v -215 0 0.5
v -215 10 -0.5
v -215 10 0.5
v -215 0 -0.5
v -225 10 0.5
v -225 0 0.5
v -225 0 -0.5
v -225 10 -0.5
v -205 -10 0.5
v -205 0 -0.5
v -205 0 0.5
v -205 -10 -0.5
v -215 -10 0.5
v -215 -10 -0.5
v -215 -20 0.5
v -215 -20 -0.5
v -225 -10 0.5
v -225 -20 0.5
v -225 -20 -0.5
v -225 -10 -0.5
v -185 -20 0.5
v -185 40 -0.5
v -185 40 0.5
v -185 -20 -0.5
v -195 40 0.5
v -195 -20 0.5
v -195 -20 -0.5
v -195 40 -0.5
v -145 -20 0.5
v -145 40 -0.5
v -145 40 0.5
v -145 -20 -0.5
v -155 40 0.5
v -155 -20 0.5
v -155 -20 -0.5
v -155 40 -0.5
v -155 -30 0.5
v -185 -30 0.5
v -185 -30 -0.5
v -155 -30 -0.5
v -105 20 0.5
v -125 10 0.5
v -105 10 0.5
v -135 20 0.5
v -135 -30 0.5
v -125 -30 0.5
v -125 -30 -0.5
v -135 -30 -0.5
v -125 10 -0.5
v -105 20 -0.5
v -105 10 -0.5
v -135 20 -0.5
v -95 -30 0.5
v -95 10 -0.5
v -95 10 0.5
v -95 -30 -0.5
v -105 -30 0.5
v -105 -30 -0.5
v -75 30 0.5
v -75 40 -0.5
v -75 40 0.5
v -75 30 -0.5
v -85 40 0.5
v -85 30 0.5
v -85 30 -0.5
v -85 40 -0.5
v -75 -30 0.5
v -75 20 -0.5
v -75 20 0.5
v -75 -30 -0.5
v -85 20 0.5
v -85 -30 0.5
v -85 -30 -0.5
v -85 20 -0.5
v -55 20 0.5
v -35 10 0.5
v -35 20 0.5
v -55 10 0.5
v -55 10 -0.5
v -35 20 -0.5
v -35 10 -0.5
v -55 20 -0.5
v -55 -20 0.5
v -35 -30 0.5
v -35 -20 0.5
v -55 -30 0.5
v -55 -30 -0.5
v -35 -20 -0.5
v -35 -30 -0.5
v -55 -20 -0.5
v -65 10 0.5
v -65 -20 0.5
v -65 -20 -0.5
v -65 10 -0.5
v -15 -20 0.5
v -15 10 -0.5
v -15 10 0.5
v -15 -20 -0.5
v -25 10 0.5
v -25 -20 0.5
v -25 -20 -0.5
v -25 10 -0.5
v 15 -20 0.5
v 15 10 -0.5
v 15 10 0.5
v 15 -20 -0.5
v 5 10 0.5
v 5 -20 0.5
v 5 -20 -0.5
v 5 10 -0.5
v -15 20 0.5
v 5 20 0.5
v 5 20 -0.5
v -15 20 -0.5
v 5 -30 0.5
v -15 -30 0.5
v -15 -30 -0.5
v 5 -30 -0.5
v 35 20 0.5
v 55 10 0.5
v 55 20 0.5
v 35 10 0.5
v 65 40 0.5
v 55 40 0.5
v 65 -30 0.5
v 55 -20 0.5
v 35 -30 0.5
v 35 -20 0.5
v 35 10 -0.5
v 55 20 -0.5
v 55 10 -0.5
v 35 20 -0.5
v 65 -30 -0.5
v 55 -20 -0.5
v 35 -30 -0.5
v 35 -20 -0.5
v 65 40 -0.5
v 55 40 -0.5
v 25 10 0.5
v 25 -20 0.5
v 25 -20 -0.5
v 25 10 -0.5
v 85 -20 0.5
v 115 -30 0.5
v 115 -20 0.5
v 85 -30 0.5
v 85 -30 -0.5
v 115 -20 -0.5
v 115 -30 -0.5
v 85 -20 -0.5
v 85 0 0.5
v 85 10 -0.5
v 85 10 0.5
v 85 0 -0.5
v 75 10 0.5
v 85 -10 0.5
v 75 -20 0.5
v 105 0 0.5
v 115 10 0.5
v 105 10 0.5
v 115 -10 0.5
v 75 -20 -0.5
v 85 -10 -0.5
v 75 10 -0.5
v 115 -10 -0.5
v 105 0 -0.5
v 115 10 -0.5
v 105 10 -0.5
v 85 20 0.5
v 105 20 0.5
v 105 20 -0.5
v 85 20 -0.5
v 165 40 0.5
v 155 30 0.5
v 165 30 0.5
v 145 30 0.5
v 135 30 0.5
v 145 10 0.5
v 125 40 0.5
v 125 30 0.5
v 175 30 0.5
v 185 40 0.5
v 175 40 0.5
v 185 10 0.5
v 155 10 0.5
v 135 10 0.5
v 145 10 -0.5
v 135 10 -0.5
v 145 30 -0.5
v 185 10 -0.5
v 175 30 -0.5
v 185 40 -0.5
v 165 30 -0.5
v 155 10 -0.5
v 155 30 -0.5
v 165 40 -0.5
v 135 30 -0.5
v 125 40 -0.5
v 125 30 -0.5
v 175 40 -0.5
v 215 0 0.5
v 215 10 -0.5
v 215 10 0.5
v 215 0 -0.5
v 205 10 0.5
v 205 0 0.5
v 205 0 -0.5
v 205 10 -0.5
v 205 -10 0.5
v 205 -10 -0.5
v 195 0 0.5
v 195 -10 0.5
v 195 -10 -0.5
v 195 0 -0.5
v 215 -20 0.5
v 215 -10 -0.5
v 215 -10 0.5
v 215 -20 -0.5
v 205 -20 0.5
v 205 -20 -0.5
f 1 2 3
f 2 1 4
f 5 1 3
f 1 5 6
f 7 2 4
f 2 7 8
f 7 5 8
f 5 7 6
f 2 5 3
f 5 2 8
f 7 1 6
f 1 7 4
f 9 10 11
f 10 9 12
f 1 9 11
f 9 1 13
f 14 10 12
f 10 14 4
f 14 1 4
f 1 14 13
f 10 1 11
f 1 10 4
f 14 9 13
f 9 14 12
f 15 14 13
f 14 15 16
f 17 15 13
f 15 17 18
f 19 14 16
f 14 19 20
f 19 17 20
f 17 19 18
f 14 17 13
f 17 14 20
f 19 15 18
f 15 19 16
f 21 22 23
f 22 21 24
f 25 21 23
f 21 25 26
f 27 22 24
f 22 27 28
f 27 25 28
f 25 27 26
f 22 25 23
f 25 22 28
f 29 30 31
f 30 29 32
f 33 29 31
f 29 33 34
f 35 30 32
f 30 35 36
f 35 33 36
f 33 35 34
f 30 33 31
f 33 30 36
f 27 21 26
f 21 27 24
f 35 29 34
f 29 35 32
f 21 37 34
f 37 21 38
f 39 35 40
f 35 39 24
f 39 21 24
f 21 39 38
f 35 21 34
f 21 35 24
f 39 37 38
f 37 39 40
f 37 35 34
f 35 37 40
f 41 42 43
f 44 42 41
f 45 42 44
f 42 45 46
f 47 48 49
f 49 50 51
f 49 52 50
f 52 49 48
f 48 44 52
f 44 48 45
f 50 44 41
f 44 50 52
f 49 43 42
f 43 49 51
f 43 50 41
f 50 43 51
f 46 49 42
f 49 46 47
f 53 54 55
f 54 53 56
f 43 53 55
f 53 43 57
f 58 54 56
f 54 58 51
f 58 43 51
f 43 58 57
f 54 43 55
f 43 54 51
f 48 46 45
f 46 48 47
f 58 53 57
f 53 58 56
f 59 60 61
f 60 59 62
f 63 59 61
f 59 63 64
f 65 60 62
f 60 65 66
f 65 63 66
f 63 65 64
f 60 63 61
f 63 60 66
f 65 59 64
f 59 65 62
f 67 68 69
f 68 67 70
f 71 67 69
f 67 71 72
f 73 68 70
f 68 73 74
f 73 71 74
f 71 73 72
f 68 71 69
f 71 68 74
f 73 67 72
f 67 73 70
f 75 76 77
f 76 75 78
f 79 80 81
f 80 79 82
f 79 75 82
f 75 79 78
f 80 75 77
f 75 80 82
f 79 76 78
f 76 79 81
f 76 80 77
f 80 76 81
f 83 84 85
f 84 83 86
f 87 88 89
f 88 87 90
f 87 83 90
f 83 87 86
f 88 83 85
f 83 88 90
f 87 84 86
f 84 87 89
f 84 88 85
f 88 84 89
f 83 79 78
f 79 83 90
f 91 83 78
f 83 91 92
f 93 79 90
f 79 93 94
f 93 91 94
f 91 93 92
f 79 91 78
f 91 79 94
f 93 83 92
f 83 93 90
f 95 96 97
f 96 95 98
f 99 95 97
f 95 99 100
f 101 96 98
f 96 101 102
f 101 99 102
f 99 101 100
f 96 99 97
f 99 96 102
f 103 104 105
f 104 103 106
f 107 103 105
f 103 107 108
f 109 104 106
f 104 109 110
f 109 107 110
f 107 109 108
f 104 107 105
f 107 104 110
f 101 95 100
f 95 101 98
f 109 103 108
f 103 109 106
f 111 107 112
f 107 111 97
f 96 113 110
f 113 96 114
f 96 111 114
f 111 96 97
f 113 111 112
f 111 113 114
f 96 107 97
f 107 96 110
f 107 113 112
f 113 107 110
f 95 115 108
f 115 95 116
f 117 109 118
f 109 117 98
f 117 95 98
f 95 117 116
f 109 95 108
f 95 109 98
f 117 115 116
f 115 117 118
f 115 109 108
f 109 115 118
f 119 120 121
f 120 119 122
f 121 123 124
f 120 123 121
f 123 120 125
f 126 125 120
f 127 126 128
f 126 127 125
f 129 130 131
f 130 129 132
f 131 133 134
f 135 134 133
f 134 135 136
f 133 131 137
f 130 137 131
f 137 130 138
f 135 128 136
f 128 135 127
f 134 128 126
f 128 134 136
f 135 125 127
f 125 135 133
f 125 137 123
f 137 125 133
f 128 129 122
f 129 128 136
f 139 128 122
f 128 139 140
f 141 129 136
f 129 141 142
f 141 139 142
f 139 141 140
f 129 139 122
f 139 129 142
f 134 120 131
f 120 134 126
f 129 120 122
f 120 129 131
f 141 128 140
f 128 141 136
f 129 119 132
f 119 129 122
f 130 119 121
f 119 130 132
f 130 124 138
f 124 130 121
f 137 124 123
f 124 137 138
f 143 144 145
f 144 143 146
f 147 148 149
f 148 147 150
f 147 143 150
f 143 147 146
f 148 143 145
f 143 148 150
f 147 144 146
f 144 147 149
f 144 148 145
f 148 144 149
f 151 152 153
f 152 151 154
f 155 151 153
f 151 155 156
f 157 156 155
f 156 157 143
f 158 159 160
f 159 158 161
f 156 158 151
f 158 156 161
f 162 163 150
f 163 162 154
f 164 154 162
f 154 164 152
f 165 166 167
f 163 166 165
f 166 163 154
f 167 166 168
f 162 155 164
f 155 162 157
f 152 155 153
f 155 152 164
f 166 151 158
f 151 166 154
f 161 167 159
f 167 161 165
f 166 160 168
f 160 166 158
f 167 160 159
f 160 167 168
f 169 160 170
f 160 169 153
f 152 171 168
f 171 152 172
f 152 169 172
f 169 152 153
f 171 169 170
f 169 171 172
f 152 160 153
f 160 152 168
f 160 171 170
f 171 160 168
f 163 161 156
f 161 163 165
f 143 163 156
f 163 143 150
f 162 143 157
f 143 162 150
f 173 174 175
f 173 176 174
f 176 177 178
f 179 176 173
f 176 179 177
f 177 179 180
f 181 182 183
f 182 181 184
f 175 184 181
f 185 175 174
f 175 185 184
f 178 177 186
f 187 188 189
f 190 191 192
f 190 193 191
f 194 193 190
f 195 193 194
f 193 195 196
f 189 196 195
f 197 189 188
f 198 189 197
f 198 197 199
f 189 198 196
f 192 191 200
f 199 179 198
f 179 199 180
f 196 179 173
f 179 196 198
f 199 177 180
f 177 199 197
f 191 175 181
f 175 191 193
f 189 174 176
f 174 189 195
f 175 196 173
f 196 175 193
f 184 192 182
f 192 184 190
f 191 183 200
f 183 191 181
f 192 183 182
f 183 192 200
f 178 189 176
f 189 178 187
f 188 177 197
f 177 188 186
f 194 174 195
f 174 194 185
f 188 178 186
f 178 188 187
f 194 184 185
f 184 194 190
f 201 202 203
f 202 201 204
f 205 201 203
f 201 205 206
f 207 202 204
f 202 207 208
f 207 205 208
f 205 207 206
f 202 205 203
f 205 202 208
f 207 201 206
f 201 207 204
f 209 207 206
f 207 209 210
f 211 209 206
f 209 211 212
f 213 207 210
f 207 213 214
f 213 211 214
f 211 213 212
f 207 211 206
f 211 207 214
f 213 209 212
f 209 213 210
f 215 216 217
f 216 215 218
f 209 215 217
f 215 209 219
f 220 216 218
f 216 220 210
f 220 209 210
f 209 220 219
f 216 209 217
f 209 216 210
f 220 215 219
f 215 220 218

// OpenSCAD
// file: ../writer.scad
/*
_ascii = " !\"#$%&'()*+,-./0123456789:;<=>?@ABCDEFGHIJKLMNOPQRSTUVWXYZ[\\]^_`abcdefghijklmnopqrstuvwxyz{|}~";
_ansi = "€ ‚ƒ„…†‡ˆ‰Š‹Œ Ž  ‘’“”•–—˜™š›œ žŸ ¡¢£¤¥¦§¨©«¬ ®¯°±²³´µ¶·¸¹º»¼½¾¿ÀÁÂÃÄÅÆÇÈÉÊËÌÍÎÏÐÑÒÓÔÕÖ×ØÙÚÛÜÝÞßàáâãäåæçèéêëìíîïðñòóôõö÷øùúûüýþÿ";

*/
// to do: define fallback character


module write(text,font,size=[10,10,1] , center=false , pixel_signifier = "1" , fallback_char = "?" ) {
	matrix = charmatrix( text[0] , font , fallback_char );
	font_height = len(matrix); 
	
	move = center ? [-textwidth( text, font, fallback_char = fallback_char ) * size[0]/2 , -font_height*size[1]/2 , -size[2]/2 ] : [0,0,0];
	translate(move)
		for ( i = [0:len(text)-1] ) {
			translate([charpos( text , i , font , fallback_char = fallback_char )*size[0],0,0])
				draw_char(text[i],font,size,pixel_signifier,fallback_char)
					if ( $children > 0 ) {
						children();
					} else {
						cube(size);
					}
		}
}

module draw_char( char , font , size=[10,10] , pixel_signifier = "1" , fallback_char = "?" ) {
	matrix = charmatrix(char , font , fallback_char );
	font_height = len(matrix); 
	union() {
		for ( y = [0:len(matrix)-1] ) 
			for ( x = [0:charwidth( char , font , fallback_char )-1] ) {
			
				if ( matrix[y][x] == pixel_signifier )
					translate([x*size[0],(font_height-y-1)*size[1],0])
						children();
			}
	}
}


function charstruct( char , font , fallback_char = "?" ) 
	= ( (font[ search( [char] , font )[0] ] == undef) ? charstruct(fallback_char,font) : font[ search( [char] , font )[0] ] );
	
function charmatrix( char , font , fallback_char = "?" ) 
	= charstruct( char , font , fallback_char )[1];
	
function charwidth( char , font , fallback_char = "?" ) 
	= len(charmatrix( char , font , fallback_char )[0]);
	
function charpos( text , index , font , pos=0 , fallback_char = "?" ) 
	= ( index==0 ? pos : charpos( text , index-1 , font , pos + charwidth( text[index-1] , font , fallback_char ) , fallback_char ) );

// return pixel width of text
function textwidth( text , font , width = 0 , index = 0 , fallback_char = "?" ) 
	= ( index==len(text) ? width : textwidth( text , font , width + charwidth( text[index] , font , fallback_char ) , index+1) );
// main file
use <../writer.scad>;
include <../fonts/default_font.scad>;

unicode_text = ["›","U","n","i","c","o","d","e","™","‹"];

write( unicode_text , default_font , center=true );
